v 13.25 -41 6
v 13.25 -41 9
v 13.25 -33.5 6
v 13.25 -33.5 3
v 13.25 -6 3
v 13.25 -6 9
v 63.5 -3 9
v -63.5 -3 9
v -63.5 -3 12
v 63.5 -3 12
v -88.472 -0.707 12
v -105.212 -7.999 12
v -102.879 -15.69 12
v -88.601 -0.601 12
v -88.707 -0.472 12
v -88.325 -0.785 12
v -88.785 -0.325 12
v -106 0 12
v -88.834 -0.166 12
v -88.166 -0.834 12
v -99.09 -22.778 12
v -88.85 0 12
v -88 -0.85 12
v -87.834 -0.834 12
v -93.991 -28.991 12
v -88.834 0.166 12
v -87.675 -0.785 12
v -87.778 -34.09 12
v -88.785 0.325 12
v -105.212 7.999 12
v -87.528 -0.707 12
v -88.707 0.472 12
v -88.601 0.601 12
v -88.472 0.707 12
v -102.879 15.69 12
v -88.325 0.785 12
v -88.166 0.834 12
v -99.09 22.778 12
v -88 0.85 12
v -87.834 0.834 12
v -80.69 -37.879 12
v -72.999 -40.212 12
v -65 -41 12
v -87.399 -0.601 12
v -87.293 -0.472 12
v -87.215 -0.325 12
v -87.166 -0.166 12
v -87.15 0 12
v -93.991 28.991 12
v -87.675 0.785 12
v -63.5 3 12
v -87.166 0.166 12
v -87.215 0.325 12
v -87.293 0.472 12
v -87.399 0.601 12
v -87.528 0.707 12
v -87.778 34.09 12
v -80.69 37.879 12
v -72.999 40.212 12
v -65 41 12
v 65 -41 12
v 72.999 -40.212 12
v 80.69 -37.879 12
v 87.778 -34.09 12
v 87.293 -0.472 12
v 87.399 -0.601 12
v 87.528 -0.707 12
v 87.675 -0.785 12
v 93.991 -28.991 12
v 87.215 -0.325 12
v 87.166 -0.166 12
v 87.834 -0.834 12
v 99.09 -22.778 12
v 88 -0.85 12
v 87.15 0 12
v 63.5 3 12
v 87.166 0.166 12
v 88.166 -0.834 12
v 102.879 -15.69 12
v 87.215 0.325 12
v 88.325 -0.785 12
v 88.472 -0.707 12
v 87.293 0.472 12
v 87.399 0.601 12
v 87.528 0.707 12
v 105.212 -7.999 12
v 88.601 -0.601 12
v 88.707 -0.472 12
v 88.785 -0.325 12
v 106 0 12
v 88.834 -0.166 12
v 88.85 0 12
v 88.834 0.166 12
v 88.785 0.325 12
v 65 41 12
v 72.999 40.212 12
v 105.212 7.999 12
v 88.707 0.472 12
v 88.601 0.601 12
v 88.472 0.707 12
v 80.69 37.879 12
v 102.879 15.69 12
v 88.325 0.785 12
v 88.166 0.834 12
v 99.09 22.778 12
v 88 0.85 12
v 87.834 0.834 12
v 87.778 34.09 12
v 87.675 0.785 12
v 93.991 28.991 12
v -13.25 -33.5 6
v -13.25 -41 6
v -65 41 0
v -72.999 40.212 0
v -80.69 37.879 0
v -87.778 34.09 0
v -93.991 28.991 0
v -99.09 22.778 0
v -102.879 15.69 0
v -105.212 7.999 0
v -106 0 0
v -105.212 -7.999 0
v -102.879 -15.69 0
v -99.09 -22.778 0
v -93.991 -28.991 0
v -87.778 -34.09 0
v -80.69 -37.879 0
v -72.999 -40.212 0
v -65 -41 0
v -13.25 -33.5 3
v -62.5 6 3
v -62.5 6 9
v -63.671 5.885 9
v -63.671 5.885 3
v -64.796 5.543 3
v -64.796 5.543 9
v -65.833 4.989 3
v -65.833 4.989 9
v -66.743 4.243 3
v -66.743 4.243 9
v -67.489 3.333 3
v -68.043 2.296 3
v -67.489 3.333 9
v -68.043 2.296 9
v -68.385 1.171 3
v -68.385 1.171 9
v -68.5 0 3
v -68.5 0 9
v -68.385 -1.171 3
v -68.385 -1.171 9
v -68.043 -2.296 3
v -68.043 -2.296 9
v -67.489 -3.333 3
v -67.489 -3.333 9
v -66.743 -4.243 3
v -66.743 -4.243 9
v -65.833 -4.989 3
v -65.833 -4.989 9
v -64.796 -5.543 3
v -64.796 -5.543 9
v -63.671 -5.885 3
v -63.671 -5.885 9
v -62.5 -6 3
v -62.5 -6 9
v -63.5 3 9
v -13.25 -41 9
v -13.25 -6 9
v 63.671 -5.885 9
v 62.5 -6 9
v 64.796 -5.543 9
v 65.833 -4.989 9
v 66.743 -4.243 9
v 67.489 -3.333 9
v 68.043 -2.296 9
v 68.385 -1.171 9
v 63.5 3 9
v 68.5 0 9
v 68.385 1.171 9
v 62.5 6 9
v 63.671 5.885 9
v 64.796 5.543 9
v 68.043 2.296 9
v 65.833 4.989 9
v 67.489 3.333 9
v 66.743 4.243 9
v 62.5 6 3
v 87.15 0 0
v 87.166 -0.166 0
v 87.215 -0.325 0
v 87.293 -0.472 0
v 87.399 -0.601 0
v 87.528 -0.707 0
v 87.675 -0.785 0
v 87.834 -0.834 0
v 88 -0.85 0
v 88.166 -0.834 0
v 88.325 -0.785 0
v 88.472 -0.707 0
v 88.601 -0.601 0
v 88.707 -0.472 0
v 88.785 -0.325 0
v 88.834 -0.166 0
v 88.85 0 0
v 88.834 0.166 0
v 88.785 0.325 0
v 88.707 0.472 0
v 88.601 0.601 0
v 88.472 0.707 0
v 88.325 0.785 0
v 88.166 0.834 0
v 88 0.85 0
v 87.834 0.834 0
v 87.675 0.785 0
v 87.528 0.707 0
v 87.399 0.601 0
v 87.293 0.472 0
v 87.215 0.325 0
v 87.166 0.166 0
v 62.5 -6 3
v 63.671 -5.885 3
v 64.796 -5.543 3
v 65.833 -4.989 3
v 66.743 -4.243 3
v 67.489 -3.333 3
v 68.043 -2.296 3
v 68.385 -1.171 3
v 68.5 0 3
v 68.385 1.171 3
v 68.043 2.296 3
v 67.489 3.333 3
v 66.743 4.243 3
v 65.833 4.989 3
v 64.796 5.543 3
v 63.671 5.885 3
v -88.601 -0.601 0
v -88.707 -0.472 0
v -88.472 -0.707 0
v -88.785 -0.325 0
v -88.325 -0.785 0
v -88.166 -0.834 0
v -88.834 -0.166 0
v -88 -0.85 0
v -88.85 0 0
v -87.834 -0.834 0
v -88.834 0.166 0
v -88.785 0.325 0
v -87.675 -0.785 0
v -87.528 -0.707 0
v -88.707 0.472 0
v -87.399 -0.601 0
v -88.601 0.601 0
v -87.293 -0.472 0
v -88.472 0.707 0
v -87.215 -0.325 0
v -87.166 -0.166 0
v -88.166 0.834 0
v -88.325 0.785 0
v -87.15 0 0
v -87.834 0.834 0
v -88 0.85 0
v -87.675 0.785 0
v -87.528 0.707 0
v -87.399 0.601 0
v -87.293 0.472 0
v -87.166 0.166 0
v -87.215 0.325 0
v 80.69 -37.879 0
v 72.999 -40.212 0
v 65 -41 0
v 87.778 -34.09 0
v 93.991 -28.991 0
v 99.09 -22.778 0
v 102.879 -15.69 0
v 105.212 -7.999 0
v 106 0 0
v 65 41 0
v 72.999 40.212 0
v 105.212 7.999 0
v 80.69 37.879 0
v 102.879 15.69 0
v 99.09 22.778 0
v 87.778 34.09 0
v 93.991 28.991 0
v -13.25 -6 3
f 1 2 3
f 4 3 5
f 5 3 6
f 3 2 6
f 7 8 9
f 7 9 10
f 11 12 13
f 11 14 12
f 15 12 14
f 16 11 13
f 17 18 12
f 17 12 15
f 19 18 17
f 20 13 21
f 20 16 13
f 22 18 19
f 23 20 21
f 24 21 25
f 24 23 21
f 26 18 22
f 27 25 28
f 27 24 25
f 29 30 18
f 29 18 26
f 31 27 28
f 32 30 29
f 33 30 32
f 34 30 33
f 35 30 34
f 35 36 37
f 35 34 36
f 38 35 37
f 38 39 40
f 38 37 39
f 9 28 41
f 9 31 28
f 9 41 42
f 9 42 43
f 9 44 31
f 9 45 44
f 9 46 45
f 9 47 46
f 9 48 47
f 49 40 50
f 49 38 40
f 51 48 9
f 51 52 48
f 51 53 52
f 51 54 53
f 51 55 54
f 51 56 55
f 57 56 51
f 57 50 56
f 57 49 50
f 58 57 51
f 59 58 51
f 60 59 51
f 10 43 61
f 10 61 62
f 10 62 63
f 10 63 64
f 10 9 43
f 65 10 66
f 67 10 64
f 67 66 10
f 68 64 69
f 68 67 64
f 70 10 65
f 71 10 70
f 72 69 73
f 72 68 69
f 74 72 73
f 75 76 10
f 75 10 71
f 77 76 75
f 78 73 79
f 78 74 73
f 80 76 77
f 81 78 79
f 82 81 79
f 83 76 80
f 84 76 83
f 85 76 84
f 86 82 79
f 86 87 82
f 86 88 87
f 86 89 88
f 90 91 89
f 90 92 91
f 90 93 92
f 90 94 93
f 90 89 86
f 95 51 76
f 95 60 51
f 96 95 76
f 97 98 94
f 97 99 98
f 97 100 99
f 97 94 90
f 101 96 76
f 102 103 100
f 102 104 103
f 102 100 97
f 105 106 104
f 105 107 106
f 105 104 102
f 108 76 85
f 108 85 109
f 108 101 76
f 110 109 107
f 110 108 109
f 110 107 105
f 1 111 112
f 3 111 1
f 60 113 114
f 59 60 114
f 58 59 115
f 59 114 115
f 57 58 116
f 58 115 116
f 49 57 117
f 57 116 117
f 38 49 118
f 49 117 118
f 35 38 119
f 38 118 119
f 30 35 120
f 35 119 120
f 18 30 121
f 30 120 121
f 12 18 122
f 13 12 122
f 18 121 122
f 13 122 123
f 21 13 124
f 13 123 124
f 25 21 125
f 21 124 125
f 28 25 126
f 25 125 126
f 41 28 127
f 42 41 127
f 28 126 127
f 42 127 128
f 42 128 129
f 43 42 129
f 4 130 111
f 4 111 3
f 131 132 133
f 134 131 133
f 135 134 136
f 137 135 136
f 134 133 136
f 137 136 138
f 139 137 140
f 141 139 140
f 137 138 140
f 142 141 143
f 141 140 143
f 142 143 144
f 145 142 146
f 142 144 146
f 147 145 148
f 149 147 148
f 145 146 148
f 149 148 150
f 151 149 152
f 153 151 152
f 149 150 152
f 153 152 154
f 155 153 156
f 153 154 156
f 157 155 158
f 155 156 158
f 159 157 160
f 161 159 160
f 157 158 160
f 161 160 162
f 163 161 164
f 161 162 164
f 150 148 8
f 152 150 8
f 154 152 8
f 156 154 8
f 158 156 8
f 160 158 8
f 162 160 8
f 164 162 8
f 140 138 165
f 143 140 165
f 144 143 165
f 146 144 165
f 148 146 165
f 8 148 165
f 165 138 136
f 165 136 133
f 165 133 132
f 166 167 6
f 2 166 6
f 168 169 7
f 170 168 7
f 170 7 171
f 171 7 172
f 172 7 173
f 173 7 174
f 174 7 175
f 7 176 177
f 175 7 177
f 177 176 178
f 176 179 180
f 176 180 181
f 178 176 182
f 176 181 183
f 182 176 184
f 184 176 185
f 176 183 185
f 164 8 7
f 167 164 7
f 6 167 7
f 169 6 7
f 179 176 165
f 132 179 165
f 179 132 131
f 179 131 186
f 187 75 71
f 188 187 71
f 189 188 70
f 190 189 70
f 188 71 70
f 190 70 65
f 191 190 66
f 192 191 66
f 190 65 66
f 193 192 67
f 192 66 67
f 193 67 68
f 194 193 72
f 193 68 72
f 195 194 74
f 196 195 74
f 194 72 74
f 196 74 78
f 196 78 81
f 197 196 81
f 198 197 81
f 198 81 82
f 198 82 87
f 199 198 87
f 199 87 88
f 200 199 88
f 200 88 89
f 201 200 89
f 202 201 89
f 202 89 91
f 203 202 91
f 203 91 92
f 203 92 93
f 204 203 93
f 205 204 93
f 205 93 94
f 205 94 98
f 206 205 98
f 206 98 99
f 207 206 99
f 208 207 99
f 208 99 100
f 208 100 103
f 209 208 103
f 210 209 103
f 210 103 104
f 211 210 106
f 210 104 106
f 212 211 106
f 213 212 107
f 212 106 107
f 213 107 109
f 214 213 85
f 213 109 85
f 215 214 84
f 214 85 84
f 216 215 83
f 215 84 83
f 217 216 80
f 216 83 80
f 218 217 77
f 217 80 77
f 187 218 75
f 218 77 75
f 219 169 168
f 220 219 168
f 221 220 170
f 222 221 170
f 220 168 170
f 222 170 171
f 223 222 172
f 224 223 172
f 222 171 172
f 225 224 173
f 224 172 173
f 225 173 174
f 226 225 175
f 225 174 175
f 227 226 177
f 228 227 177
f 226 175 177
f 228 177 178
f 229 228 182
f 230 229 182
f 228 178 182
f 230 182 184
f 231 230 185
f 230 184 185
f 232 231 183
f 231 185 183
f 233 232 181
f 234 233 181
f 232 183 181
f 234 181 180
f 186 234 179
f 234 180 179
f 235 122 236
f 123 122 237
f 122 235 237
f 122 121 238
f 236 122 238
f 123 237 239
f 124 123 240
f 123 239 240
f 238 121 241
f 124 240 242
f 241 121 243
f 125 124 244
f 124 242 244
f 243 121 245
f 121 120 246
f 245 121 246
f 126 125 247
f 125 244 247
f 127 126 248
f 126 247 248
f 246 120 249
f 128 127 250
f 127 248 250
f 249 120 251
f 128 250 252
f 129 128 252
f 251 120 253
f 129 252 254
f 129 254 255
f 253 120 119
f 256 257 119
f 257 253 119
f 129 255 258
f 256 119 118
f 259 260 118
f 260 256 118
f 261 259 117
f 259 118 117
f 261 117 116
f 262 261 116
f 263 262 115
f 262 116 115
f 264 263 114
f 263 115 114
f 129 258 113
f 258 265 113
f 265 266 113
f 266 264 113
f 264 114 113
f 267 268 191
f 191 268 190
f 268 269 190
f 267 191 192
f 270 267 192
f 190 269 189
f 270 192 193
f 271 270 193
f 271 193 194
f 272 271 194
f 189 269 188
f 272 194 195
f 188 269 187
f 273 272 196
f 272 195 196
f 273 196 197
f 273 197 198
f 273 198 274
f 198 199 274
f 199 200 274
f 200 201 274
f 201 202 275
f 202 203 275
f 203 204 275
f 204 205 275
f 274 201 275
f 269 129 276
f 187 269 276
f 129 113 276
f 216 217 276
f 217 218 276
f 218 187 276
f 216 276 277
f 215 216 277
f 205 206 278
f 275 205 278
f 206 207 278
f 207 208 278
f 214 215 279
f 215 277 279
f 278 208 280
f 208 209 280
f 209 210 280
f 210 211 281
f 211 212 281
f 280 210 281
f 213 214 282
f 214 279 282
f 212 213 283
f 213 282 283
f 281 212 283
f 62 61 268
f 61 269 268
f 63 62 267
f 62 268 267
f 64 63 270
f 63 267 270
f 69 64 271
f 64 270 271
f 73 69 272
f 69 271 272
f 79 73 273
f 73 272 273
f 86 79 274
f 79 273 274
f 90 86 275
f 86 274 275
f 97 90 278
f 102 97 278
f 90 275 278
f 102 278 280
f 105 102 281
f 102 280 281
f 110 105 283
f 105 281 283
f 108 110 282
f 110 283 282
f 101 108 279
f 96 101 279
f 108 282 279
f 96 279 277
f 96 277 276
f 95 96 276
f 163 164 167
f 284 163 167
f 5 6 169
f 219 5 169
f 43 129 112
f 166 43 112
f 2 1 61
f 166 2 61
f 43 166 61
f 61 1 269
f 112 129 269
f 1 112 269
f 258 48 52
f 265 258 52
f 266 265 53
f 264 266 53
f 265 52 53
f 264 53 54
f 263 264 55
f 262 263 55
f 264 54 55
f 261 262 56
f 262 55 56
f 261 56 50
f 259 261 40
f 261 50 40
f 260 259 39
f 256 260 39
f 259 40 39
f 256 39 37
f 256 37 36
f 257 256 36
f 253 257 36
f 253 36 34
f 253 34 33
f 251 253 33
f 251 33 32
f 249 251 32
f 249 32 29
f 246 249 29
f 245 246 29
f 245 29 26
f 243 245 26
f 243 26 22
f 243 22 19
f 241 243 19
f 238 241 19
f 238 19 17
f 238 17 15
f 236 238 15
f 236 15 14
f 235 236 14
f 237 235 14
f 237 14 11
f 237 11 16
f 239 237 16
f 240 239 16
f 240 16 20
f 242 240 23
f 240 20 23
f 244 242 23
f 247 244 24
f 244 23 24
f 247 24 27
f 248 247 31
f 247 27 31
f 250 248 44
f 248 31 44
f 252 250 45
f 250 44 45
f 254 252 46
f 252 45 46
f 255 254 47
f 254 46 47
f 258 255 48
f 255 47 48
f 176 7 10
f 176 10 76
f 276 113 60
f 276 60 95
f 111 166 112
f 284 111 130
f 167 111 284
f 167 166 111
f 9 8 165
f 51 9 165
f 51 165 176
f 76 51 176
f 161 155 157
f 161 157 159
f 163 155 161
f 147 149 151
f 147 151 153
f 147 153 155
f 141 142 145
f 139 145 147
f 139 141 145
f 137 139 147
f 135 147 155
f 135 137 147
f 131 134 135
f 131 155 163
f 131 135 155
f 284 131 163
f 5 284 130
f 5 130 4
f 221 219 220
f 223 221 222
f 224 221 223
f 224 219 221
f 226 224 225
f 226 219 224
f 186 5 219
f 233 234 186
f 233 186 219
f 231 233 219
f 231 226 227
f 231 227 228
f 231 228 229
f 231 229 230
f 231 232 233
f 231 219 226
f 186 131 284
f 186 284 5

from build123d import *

# Parameters (mm, degrees)
PAD_DEPTH          = 9
POCKET_DEPTH       = 6
SKETCH002_W        = 26.5
SKETCH002_H        = 35
POCKET001_DEPTH    = 6
SKETCH003_W        = 127
SKETCH003_H        = 6
PAD001_DEPTH       = 3
SKETCH004_R        = 0.85
POCKET002_DEPTH    = 467.245989
POLARPATTERN_COUNT = 2
SKETCH005_W        = 26.5
SKETCH005_H        = 7.5
PAD002_DEPTH       = 3


with BuildPart() as part:
    # Sketch → Pad (new body)
    with BuildSketch(Plane.XY):
        with BuildLine():
            ThreePointArc((-65, 41), (-106, 0), (-65, -41))
            Line((-65, -41), (65, -41))
            ThreePointArc((65, -41), (106, 0), (65, 41))
            Line((-65, 41), (65, 41))
        make_face()
    extrude(amount=PAD_DEPTH)

    # Sketch001 (on Face6 of Pad) → Pocket (cut)
    with BuildSketch(Plane.XY.offset(9)):
        with BuildLine():
            ThreePointArc((-62.5, 6), (-68.5, 0), (-62.5, -6))
            Line((-62.5, -6), (62.5, -6))
            ThreePointArc((62.5, -6), (68.5, 0), (62.5, 6))
            Line((-62.5, 6), (62.5, 6))
        make_face()
    extrude(amount=-POCKET_DEPTH, mode=Mode.SUBTRACT)

    # Sketch002 (on Face5 of Pocket) → Pocket001 (cut)
    with BuildSketch(Plane.XY.offset(9)):
        with Locations((0, -23.5)):
            Rectangle(SKETCH002_W, SKETCH002_H)
    extrude(amount=-POCKET001_DEPTH, mode=Mode.SUBTRACT)

    # Sketch003 (on Face5 of Pocket001) → Pad001 (join)
    with BuildSketch(Plane.XY.offset(9)):
        with BuildLine():
            ThreePointArc((-65, 41), (-106, 0), (-65, -41))
            Line((-65, -41), (65, -41))
            ThreePointArc((65, -41), (106, 0), (65, 41))
            Line((-65, 41), (65, 41))
        make_face()
        Rectangle(SKETCH003_W, SKETCH003_H, mode=Mode.SUBTRACT)
    extrude(amount=PAD001_DEPTH)

    # Sketch004 (on Face12 of Pad001) → Pocket002 (cut, through all)
    with BuildSketch(Plane.XY.offset(12)):
        with Locations((-88, 0)):
            Circle(SKETCH004_R)
    pocket002 = extrude(amount=-POCKET002_DEPTH, mode=Mode.SUBTRACT)

    # PolarPattern: Pocket002 ×2 about axis
    polarpattern_axis = Axis((0, 0, 12), (0, 0, 1))
    for i in range(1, POLARPATTERN_COUNT):
        add(pocket002.rotate(polarpattern_axis, i * 360 / POLARPATTERN_COUNT), mode=Mode.SUBTRACT)

    # Sketch005 (on Face10 of PolarPattern) → Pad002 (join)
    with BuildSketch(Plane.XY.offset(3)):
        with Locations((0, -37.25)):
            Rectangle(SKETCH005_W, SKETCH005_H)
    extrude(amount=PAD002_DEPTH)


solid = part.part
